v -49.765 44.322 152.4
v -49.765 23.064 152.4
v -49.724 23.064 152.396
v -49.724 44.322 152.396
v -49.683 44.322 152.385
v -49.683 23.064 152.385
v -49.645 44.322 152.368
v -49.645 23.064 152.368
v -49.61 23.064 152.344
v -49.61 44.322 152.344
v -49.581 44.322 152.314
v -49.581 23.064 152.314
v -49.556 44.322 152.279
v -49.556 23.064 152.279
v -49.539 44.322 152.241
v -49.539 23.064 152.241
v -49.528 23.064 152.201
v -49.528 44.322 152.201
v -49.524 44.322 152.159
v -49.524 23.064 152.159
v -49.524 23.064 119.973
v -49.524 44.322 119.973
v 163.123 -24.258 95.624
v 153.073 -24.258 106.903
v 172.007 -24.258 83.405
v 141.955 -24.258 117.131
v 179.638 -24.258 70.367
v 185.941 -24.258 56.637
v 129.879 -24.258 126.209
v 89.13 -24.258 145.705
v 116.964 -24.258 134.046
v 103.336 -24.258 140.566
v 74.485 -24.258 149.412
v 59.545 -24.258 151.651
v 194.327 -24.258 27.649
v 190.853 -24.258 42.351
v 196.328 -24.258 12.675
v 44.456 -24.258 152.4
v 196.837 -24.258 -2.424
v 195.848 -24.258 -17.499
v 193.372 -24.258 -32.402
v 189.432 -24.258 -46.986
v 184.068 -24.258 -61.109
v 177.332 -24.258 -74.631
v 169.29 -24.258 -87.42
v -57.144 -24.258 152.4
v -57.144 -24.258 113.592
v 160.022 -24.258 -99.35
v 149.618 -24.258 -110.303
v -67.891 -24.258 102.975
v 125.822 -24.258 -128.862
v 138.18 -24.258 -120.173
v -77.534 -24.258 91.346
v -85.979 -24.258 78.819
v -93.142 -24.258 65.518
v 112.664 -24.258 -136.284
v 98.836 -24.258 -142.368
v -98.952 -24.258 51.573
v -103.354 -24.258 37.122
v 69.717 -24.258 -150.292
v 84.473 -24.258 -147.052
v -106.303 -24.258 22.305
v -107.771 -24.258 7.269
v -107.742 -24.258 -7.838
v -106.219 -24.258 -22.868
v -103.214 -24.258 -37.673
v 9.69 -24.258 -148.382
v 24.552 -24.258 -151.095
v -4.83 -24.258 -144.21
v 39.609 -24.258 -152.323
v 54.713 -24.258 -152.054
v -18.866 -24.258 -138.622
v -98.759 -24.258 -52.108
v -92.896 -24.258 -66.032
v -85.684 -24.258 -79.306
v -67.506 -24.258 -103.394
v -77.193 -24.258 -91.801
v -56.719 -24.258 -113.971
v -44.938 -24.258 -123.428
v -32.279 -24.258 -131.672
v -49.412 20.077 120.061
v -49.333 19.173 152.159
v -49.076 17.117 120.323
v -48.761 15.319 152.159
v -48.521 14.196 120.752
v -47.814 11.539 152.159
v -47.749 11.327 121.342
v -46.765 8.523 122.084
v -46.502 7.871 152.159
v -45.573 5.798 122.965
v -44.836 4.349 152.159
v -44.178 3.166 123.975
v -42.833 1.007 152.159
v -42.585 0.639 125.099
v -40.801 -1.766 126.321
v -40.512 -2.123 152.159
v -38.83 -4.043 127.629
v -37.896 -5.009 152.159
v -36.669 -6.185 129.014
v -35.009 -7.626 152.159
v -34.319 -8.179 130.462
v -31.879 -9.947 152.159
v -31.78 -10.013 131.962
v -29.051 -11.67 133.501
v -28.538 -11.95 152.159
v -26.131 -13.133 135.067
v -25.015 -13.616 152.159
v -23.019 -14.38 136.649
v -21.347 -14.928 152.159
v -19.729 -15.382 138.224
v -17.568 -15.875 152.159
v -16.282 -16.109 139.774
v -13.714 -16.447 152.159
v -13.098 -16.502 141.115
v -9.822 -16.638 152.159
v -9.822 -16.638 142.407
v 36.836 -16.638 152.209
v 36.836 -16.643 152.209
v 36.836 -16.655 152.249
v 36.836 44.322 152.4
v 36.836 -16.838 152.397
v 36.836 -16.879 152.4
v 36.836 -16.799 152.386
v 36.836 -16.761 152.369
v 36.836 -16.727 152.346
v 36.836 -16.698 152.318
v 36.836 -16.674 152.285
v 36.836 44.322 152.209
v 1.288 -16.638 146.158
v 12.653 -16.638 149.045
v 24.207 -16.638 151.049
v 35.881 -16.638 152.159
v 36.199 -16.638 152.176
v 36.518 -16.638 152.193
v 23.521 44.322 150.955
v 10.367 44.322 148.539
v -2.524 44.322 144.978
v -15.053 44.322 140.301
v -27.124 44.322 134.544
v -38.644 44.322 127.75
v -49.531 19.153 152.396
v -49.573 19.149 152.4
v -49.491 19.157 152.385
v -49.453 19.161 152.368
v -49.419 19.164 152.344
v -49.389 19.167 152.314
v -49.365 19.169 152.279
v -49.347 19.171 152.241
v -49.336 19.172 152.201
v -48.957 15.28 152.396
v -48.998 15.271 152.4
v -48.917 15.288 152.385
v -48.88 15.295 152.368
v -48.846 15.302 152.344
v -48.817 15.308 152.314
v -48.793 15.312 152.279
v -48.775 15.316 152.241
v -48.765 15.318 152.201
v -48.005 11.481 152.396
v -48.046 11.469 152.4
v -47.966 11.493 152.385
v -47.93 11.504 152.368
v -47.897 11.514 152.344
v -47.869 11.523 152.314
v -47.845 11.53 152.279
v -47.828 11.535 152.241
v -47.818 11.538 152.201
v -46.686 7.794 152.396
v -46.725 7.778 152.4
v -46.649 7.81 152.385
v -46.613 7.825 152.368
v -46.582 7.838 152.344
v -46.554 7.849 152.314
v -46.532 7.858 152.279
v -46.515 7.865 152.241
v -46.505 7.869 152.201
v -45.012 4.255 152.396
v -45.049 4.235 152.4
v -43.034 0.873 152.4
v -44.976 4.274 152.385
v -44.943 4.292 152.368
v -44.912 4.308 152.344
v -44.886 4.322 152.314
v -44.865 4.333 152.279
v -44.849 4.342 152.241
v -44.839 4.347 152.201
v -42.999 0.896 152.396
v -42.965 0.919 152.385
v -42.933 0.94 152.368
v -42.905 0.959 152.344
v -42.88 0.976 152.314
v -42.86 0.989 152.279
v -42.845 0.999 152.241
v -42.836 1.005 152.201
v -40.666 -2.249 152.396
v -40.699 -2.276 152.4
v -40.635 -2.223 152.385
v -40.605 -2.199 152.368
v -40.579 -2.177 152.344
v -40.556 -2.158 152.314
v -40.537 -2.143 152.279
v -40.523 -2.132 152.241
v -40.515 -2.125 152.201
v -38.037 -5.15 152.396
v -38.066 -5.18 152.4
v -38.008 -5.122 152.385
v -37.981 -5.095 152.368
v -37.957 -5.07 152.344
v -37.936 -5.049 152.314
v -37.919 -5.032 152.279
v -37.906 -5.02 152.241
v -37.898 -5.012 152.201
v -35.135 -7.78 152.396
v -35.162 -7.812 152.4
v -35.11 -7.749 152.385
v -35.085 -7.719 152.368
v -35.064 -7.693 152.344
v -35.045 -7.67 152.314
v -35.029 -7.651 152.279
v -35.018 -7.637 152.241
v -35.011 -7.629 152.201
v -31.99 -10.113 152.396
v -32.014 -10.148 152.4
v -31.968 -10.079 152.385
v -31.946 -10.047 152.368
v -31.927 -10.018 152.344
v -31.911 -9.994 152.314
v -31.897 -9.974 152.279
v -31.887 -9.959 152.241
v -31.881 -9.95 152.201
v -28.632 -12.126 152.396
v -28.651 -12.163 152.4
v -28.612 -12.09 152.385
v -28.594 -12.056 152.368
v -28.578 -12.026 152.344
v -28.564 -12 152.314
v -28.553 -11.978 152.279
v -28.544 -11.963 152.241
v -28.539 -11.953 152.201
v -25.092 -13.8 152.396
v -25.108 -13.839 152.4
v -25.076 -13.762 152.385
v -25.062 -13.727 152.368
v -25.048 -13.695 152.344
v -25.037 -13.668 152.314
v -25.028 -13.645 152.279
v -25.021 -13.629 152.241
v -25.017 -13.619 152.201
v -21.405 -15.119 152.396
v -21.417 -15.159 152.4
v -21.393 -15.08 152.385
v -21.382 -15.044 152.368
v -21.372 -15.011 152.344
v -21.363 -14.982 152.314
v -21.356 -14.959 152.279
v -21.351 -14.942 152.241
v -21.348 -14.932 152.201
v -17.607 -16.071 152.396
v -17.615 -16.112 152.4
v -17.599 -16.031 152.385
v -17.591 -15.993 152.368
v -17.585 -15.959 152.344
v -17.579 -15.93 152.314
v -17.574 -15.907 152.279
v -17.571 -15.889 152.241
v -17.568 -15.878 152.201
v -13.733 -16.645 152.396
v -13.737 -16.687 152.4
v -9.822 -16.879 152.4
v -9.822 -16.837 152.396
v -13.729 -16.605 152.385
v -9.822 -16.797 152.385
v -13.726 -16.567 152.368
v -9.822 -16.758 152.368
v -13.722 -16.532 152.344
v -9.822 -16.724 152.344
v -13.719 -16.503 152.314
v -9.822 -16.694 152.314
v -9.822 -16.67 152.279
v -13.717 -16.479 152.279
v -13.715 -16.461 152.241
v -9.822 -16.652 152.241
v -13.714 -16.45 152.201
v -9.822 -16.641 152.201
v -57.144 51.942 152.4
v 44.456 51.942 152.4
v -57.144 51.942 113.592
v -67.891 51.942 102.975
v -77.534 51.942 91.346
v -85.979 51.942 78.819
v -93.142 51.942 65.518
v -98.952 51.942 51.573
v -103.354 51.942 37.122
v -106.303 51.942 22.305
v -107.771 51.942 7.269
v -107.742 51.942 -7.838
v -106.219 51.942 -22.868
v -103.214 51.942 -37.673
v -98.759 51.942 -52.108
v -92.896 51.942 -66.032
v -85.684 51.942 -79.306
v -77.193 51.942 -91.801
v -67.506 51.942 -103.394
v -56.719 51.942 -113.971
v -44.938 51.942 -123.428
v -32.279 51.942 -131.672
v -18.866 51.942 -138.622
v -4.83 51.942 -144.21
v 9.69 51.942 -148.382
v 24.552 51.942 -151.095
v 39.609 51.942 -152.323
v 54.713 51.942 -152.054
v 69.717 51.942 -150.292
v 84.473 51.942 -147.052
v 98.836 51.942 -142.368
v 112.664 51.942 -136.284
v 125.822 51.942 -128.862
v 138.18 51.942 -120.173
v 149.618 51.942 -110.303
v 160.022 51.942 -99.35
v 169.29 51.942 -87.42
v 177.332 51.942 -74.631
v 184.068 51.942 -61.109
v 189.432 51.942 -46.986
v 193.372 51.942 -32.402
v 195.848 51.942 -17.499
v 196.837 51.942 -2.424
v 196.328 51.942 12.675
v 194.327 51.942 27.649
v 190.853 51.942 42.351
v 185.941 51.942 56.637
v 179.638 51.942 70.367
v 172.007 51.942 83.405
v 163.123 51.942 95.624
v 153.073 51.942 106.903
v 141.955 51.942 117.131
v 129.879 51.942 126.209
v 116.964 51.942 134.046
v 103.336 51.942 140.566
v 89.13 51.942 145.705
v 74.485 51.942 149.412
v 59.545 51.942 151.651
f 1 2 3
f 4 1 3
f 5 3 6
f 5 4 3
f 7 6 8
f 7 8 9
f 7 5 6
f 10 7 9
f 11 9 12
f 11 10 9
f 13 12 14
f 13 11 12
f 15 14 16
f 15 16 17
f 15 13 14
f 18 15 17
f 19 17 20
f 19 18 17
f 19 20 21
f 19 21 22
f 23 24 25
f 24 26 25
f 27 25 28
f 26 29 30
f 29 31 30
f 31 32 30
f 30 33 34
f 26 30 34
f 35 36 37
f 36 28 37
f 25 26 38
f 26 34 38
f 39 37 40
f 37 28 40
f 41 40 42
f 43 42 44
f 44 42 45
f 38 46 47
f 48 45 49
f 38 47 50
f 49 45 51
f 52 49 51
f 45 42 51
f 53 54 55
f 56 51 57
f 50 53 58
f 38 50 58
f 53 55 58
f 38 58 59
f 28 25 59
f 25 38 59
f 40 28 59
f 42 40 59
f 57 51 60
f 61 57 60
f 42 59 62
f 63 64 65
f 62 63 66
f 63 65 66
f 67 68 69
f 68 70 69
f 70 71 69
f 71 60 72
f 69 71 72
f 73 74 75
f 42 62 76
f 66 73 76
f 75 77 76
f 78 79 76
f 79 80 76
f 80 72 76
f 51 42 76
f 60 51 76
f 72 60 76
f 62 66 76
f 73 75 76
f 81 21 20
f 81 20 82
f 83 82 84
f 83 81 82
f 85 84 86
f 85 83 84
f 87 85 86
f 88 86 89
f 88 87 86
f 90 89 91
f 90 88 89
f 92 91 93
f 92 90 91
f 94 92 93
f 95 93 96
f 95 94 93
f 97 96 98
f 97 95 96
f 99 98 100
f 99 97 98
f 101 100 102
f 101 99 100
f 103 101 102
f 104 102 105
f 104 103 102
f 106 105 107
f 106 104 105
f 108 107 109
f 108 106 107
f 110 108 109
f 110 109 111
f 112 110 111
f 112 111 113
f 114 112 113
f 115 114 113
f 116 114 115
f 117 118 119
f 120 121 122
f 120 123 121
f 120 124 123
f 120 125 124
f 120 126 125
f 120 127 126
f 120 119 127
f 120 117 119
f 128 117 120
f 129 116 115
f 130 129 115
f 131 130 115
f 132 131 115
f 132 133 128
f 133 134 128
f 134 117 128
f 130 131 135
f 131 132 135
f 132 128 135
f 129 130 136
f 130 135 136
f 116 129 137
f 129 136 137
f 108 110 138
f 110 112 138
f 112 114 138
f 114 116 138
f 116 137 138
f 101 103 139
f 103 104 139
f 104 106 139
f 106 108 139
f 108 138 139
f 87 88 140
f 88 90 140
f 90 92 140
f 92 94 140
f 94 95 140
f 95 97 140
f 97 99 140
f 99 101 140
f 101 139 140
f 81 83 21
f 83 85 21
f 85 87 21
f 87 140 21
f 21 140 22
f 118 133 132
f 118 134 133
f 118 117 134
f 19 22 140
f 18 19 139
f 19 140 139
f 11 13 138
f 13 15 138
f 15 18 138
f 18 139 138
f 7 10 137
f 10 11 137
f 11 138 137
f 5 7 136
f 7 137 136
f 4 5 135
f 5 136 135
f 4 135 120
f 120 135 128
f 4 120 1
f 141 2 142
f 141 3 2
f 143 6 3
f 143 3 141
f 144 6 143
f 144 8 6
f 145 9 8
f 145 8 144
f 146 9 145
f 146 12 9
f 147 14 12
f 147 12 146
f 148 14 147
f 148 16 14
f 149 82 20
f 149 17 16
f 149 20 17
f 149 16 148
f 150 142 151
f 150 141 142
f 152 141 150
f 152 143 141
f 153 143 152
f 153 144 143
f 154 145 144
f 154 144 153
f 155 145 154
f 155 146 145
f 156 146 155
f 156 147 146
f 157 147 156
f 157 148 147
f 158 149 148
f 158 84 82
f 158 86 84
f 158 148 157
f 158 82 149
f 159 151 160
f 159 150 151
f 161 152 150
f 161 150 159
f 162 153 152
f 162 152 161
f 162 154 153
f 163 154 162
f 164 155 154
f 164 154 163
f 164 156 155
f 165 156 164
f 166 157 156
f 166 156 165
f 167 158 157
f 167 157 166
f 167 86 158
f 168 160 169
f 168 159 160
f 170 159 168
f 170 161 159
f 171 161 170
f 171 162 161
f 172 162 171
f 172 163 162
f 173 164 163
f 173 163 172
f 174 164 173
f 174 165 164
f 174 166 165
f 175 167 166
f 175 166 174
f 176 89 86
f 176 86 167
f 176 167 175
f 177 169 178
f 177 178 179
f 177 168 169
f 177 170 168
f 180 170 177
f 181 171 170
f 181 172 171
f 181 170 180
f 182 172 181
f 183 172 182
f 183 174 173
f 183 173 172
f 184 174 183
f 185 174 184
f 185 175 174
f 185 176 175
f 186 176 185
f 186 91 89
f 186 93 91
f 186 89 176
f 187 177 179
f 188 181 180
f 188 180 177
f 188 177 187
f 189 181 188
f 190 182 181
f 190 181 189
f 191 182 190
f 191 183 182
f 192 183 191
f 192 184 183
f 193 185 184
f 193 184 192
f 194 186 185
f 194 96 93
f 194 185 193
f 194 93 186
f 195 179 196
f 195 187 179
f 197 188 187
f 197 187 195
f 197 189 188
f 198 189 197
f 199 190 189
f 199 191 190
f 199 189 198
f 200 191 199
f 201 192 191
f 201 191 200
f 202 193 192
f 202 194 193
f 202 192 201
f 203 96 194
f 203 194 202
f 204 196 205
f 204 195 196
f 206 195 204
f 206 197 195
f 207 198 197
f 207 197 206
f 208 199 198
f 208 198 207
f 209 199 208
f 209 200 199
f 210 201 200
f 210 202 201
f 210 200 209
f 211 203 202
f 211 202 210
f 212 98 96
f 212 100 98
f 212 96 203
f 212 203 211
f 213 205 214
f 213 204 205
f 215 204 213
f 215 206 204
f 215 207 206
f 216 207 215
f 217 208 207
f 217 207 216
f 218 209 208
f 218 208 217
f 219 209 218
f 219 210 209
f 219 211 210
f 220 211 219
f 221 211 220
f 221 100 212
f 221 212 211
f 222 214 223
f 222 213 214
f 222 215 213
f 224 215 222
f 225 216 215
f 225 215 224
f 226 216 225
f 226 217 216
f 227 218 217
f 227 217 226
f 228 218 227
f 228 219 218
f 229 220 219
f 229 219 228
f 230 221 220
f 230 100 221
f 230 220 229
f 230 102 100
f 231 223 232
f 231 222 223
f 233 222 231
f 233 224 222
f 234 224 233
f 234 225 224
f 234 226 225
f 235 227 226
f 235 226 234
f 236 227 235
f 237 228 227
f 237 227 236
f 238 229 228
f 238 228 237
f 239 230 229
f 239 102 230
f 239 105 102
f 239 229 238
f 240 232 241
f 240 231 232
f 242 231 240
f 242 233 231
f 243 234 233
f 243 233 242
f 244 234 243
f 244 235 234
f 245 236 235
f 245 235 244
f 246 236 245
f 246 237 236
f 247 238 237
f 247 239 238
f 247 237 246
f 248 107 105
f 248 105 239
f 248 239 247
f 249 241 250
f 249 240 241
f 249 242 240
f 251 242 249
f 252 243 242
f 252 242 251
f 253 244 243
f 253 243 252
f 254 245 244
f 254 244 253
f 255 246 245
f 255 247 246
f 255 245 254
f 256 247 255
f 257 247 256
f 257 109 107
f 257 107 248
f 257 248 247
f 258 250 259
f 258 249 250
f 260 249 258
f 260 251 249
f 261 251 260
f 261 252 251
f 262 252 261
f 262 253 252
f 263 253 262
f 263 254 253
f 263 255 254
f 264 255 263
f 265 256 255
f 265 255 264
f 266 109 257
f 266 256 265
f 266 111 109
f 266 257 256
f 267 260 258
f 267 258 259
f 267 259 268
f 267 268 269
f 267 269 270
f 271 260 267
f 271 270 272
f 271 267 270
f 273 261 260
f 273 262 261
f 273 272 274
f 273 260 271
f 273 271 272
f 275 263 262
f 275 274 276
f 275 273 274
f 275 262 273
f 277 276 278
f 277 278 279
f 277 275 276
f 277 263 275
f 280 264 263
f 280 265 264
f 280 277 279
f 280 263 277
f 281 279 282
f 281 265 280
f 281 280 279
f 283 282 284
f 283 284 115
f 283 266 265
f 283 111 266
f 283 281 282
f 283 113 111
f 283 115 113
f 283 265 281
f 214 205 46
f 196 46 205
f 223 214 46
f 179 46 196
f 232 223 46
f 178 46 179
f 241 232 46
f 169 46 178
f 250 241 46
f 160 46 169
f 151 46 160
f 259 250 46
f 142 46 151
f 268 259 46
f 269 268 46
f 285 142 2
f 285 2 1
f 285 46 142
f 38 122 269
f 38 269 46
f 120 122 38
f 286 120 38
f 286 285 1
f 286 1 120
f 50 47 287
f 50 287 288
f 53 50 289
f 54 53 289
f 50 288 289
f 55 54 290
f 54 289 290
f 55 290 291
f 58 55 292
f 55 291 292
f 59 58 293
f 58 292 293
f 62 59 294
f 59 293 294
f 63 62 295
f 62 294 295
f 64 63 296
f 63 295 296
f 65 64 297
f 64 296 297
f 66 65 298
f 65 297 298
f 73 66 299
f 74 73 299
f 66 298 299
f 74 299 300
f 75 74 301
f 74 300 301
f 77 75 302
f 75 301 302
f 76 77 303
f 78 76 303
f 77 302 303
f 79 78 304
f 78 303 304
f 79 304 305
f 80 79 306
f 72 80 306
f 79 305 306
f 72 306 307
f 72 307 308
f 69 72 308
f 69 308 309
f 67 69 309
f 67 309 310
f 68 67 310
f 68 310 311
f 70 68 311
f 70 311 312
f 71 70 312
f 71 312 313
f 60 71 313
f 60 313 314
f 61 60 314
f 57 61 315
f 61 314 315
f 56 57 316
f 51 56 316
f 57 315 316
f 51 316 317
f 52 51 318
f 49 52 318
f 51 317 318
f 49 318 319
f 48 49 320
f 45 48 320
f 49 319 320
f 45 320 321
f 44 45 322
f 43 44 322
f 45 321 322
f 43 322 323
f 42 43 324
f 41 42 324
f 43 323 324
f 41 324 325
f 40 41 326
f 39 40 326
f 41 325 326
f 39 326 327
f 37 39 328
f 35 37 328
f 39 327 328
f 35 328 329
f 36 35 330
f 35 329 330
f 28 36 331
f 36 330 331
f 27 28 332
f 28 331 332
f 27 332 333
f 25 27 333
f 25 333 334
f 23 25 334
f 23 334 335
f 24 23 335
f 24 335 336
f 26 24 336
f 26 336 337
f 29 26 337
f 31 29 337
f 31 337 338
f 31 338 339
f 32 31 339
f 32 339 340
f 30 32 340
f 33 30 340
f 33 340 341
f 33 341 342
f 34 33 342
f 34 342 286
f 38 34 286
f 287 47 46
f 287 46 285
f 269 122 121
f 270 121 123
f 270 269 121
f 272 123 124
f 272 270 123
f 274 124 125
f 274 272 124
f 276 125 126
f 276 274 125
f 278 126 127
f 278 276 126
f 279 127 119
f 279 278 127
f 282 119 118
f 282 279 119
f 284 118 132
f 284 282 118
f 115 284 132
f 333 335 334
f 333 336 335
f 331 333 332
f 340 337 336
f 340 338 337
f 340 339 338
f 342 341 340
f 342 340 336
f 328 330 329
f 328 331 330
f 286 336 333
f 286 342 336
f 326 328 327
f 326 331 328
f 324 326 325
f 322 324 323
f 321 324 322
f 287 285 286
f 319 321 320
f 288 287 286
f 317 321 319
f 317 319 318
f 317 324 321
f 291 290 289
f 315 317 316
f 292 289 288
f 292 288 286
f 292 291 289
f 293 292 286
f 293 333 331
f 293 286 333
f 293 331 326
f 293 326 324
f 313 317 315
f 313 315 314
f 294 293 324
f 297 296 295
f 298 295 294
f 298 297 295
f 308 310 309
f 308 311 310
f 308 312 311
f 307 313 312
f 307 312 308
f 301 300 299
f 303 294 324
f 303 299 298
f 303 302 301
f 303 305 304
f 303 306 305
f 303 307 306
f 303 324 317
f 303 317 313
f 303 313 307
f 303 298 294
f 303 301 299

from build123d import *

# Parameters (mm, degrees)
F0_W         = 101.6
F0_H         = 76.2
F1_DEPTH     = 152.4
F2_T         = -7.62
F3_R         = 39.7017420332
F1_FACE_W    = 76.2
F1_FACE_H    = 152.4
F5_T3_ANGLE  = 90
F5_T6_DEPTH  = 21.2582579668
F5_T9_DEPTH  = 46.6582579668
F5_S10_R     = 152.4
F5_T11_DEPTH = 25


# Not quite as in the source:
# - a fillet or chamfer that OpenCascade refuses, or shapes differently, is made with other operations: its cross-section is extruded or revolved along the edge and cut away or added


with BuildPart() as f1:
    # F0 (on Top) → F1 (new body)
    with BuildSketch(Plane.XY):
        with Locations((-6.3440203667, 13.8422726145)):
            Rectangle(F0_W, F0_H)
    extrude(amount=F1_DEPTH)

    # F2
    f2_openings = [f1.faces().sort_by_distance(p)[0] for p in [
        (-6.34402, 13.842273, 152.4),
    ]]
    offset(amount=F2_T, openings=f2_openings)

    # F3
    f3_edges = [f1.edges().sort_by_distance(p)[0] for p in [
        (-49.52402, -16.637727, 80.01),
    ]]
    fillet(f3_edges, radius=F3_R)

    # F1_face (on face) → F4 (revolve)
    with BuildSketch(Plane(origin=(44.4559796333, 13.8422726145, 76.2), x_dir=(0, 1, 0), z_dir=(1, 0, 0))):
        Rectangle(F1_FACE_W, F1_FACE_H)
    revolve(axis=Axis((44.4559796333, 13.8422726145, 0), (0, -1, 0)))

    # F5: fillet of radius 0.2414213562 on 1 edges, made by hand


with BuildPart() as f5_tool1:
    # F5_s2 → F5_t3 (revolve)
    with BuildSketch(Plane.XZ.offset(-23.0640146477)):
        with BuildLine():
            ThreePointArc((-49.7654417229, 152.4), (-49.5947310448, 152.3292893219), (-49.5240203667, 152.1585786438))
            Line((-49.5240203667, 152.1585786438), (-49.5240203667, 152.4))
            Line((-49.5240203667, 152.4), (-49.7654417229, 152.4))
        make_face()
    revolve(axis=Axis((-9.8222783334, 23.0640146477, 152.4), (0, 0, 1)), revolution_arc=F5_T3_ANGLE)


with BuildPart() as f5_tool4:
    # F5_s5 → F5_t6 (new body)
    with BuildSketch(Plane.XZ.offset(-44.3222726145)):
        with BuildLine():
            ThreePointArc((-49.7654417229, 152.4), (-49.5947310448, 152.3292893219), (-49.5240203667, 152.1585786438))
            Line((-49.5240203667, 152.1585786438), (-49.5240203667, 152.4))
            Line((-49.5240203667, 152.4), (-49.7654417229, 152.4))
        make_face()
    extrude(amount=F5_T6_DEPTH)


with BuildPart() as f5_tool7:
    # F5_s8 → F5_t9 (new body)
    with BuildSketch(Plane.YZ.offset(-9.8222783334)):
        with BuildLine():
            ThreePointArc((-16.8791487417, 152.4), (-16.7084380636, 152.3292893219), (-16.6377273855, 152.1585786438))
            Line((-16.6377273855, 152.1585786438), (-16.6377273855, 152.4))
            Line((-16.6377273855, 152.4), (-16.8791487417, 152.4))
        make_face()
    extrude(amount=F5_T9_DEPTH)

    # F5_s10 → F5_t11 (cut, symmetric)
    with BuildSketch(Plane.XZ.offset(16.8)):
        with Locations((44.4559796333, 0)):
            Circle(F5_S10_R)
    extrude(amount=F5_T11_DEPTH, both=True, mode=Mode.SUBTRACT)


with BuildPart() as f1_1:
    add(f1.part)

    # F5_t12: cut F5_tool1, F5_tool4, F5_tool7
    add([f5_tool1.part, f5_tool4.part, f5_tool7.part], mode=Mode.SUBTRACT)


solid = f1_1.part
